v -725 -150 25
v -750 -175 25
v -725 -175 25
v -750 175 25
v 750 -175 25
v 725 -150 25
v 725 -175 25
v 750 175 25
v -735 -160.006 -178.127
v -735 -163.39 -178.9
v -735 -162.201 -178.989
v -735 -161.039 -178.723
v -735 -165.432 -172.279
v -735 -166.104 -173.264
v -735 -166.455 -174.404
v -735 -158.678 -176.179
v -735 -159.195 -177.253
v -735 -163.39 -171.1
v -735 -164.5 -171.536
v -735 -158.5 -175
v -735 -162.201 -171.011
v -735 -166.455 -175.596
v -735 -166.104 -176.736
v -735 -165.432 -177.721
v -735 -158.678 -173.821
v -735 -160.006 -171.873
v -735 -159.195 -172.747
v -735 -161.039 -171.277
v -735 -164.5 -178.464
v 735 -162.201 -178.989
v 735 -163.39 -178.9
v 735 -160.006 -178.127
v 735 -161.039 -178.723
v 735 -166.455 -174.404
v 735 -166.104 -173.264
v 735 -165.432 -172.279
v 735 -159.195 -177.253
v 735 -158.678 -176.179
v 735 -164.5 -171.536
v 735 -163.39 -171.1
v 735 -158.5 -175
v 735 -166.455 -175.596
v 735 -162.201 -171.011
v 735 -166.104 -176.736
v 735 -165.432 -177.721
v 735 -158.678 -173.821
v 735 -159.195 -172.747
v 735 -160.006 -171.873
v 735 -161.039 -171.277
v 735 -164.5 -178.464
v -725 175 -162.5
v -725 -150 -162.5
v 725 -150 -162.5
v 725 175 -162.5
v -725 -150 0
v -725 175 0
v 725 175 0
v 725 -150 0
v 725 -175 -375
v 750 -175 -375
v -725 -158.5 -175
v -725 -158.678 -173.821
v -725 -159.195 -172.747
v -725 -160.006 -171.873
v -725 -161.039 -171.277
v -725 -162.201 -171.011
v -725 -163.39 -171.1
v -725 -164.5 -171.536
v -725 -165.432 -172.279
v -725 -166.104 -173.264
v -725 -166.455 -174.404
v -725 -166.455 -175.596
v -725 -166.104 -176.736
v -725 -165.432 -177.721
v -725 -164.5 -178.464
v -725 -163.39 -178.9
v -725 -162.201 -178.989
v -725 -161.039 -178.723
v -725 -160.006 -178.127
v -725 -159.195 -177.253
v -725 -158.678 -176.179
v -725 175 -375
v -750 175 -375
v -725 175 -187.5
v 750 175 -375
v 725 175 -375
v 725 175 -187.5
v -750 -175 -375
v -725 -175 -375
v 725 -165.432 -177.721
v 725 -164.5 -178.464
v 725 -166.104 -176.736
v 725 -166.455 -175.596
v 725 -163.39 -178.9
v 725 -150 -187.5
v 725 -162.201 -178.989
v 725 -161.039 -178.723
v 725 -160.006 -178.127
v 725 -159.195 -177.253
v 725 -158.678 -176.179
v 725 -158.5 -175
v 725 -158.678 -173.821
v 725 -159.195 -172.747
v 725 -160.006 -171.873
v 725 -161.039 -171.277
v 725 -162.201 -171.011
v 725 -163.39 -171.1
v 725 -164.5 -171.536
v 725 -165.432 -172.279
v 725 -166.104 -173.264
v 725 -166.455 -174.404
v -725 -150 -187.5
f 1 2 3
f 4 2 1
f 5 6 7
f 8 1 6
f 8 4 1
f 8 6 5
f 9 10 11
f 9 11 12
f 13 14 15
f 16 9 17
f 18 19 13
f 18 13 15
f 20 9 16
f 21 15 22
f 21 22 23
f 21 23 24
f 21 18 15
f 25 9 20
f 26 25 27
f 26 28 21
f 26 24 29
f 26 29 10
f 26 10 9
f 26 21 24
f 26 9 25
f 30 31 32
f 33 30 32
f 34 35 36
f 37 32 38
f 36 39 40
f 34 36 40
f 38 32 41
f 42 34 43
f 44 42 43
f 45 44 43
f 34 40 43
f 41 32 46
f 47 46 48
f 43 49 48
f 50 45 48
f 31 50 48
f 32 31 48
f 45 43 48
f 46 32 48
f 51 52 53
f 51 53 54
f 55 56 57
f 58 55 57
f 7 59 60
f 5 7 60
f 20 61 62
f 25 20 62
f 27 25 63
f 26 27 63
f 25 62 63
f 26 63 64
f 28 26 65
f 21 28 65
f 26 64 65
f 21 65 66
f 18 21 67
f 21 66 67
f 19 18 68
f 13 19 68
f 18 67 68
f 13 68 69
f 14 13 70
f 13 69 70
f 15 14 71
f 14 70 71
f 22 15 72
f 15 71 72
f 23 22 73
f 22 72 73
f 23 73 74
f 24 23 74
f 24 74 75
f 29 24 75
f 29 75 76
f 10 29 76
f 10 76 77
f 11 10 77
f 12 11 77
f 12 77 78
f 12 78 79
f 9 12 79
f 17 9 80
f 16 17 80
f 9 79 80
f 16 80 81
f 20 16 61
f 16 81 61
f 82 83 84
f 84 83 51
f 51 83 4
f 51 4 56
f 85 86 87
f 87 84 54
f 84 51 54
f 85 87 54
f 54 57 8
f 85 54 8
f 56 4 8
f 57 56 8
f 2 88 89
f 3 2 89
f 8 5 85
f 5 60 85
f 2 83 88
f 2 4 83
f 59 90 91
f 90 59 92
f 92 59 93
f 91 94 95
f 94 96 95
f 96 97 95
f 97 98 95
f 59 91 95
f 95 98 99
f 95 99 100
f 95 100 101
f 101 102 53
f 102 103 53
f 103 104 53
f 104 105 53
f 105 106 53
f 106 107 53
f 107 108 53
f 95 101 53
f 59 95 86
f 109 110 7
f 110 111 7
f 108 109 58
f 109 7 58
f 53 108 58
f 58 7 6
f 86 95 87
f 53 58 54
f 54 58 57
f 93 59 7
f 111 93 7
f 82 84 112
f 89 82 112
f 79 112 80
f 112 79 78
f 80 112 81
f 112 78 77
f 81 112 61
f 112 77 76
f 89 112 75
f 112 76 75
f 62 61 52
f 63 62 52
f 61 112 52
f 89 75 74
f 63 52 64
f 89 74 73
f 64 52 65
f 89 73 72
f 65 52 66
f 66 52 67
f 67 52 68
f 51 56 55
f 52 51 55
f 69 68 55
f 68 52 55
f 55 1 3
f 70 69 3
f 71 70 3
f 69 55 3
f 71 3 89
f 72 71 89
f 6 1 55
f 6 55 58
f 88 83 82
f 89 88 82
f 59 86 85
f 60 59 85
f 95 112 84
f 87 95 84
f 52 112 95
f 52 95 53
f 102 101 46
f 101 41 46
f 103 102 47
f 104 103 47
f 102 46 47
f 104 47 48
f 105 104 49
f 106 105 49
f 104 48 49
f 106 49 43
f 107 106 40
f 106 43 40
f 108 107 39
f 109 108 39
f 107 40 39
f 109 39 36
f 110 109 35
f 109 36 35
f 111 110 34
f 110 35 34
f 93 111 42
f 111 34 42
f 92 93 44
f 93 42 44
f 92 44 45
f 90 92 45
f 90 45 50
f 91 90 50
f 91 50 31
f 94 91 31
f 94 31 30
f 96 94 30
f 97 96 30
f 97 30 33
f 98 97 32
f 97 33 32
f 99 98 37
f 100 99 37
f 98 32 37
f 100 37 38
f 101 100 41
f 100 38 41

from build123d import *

# Parameters (mm, degrees)
F0_W     = 1500
F0_H     = 350
F1_DEPTH = 25
F2_W     = 25
F2_H     = 350
F3_DEPTH = 375
F4_W     = 325
F4_H     = 25
F5_DEPTH = 1450
F6_R     = 4
F7_DEPTH = 735
F8_W     = 1450
F8_H     = 25
F9_DEPTH = 25


with BuildPart() as f1:
    # F0 (on Top) → F1 (new body)
    with BuildSketch(Plane.XY):
        Rectangle(F0_W, F0_H)
    extrude(amount=F1_DEPTH)

    # F2 (on face) → F3 (join)
    with BuildSketch(Plane(origin=(0, 0, 0), x_dir=(1, 0, 0), z_dir=(0, 0, -1))):
        with Locations((-737.5, 0)):
            Rectangle(F2_W, F2_H)
        with Locations((737.5, 0)):
            Rectangle(F2_W, F2_H)
    extrude(amount=F3_DEPTH)

    # F4 (on face) → F5 (join, through all)
    with BuildSketch(Plane.YZ.offset(-725)):
        with Locations((12.5, -175)):
            Rectangle(F4_W, F4_H)
    extrude(amount=F5_DEPTH)

    # F6 (on Right) → F7 (cut, symmetric)
    with BuildSketch(Plane.YZ):
        with Locations((-162.5, -175)):
            Circle(F6_R)
    extrude(amount=F7_DEPTH, both=True, mode=Mode.SUBTRACT)

    # F8 (on face) → F9 (cut)
    with BuildSketch(Plane.XY.offset(25)):
        with Locations((0, -162.5)):
            Rectangle(F8_W, F8_H)
    extrude(amount=-F9_DEPTH, mode=Mode.SUBTRACT)


solid = f1.part
